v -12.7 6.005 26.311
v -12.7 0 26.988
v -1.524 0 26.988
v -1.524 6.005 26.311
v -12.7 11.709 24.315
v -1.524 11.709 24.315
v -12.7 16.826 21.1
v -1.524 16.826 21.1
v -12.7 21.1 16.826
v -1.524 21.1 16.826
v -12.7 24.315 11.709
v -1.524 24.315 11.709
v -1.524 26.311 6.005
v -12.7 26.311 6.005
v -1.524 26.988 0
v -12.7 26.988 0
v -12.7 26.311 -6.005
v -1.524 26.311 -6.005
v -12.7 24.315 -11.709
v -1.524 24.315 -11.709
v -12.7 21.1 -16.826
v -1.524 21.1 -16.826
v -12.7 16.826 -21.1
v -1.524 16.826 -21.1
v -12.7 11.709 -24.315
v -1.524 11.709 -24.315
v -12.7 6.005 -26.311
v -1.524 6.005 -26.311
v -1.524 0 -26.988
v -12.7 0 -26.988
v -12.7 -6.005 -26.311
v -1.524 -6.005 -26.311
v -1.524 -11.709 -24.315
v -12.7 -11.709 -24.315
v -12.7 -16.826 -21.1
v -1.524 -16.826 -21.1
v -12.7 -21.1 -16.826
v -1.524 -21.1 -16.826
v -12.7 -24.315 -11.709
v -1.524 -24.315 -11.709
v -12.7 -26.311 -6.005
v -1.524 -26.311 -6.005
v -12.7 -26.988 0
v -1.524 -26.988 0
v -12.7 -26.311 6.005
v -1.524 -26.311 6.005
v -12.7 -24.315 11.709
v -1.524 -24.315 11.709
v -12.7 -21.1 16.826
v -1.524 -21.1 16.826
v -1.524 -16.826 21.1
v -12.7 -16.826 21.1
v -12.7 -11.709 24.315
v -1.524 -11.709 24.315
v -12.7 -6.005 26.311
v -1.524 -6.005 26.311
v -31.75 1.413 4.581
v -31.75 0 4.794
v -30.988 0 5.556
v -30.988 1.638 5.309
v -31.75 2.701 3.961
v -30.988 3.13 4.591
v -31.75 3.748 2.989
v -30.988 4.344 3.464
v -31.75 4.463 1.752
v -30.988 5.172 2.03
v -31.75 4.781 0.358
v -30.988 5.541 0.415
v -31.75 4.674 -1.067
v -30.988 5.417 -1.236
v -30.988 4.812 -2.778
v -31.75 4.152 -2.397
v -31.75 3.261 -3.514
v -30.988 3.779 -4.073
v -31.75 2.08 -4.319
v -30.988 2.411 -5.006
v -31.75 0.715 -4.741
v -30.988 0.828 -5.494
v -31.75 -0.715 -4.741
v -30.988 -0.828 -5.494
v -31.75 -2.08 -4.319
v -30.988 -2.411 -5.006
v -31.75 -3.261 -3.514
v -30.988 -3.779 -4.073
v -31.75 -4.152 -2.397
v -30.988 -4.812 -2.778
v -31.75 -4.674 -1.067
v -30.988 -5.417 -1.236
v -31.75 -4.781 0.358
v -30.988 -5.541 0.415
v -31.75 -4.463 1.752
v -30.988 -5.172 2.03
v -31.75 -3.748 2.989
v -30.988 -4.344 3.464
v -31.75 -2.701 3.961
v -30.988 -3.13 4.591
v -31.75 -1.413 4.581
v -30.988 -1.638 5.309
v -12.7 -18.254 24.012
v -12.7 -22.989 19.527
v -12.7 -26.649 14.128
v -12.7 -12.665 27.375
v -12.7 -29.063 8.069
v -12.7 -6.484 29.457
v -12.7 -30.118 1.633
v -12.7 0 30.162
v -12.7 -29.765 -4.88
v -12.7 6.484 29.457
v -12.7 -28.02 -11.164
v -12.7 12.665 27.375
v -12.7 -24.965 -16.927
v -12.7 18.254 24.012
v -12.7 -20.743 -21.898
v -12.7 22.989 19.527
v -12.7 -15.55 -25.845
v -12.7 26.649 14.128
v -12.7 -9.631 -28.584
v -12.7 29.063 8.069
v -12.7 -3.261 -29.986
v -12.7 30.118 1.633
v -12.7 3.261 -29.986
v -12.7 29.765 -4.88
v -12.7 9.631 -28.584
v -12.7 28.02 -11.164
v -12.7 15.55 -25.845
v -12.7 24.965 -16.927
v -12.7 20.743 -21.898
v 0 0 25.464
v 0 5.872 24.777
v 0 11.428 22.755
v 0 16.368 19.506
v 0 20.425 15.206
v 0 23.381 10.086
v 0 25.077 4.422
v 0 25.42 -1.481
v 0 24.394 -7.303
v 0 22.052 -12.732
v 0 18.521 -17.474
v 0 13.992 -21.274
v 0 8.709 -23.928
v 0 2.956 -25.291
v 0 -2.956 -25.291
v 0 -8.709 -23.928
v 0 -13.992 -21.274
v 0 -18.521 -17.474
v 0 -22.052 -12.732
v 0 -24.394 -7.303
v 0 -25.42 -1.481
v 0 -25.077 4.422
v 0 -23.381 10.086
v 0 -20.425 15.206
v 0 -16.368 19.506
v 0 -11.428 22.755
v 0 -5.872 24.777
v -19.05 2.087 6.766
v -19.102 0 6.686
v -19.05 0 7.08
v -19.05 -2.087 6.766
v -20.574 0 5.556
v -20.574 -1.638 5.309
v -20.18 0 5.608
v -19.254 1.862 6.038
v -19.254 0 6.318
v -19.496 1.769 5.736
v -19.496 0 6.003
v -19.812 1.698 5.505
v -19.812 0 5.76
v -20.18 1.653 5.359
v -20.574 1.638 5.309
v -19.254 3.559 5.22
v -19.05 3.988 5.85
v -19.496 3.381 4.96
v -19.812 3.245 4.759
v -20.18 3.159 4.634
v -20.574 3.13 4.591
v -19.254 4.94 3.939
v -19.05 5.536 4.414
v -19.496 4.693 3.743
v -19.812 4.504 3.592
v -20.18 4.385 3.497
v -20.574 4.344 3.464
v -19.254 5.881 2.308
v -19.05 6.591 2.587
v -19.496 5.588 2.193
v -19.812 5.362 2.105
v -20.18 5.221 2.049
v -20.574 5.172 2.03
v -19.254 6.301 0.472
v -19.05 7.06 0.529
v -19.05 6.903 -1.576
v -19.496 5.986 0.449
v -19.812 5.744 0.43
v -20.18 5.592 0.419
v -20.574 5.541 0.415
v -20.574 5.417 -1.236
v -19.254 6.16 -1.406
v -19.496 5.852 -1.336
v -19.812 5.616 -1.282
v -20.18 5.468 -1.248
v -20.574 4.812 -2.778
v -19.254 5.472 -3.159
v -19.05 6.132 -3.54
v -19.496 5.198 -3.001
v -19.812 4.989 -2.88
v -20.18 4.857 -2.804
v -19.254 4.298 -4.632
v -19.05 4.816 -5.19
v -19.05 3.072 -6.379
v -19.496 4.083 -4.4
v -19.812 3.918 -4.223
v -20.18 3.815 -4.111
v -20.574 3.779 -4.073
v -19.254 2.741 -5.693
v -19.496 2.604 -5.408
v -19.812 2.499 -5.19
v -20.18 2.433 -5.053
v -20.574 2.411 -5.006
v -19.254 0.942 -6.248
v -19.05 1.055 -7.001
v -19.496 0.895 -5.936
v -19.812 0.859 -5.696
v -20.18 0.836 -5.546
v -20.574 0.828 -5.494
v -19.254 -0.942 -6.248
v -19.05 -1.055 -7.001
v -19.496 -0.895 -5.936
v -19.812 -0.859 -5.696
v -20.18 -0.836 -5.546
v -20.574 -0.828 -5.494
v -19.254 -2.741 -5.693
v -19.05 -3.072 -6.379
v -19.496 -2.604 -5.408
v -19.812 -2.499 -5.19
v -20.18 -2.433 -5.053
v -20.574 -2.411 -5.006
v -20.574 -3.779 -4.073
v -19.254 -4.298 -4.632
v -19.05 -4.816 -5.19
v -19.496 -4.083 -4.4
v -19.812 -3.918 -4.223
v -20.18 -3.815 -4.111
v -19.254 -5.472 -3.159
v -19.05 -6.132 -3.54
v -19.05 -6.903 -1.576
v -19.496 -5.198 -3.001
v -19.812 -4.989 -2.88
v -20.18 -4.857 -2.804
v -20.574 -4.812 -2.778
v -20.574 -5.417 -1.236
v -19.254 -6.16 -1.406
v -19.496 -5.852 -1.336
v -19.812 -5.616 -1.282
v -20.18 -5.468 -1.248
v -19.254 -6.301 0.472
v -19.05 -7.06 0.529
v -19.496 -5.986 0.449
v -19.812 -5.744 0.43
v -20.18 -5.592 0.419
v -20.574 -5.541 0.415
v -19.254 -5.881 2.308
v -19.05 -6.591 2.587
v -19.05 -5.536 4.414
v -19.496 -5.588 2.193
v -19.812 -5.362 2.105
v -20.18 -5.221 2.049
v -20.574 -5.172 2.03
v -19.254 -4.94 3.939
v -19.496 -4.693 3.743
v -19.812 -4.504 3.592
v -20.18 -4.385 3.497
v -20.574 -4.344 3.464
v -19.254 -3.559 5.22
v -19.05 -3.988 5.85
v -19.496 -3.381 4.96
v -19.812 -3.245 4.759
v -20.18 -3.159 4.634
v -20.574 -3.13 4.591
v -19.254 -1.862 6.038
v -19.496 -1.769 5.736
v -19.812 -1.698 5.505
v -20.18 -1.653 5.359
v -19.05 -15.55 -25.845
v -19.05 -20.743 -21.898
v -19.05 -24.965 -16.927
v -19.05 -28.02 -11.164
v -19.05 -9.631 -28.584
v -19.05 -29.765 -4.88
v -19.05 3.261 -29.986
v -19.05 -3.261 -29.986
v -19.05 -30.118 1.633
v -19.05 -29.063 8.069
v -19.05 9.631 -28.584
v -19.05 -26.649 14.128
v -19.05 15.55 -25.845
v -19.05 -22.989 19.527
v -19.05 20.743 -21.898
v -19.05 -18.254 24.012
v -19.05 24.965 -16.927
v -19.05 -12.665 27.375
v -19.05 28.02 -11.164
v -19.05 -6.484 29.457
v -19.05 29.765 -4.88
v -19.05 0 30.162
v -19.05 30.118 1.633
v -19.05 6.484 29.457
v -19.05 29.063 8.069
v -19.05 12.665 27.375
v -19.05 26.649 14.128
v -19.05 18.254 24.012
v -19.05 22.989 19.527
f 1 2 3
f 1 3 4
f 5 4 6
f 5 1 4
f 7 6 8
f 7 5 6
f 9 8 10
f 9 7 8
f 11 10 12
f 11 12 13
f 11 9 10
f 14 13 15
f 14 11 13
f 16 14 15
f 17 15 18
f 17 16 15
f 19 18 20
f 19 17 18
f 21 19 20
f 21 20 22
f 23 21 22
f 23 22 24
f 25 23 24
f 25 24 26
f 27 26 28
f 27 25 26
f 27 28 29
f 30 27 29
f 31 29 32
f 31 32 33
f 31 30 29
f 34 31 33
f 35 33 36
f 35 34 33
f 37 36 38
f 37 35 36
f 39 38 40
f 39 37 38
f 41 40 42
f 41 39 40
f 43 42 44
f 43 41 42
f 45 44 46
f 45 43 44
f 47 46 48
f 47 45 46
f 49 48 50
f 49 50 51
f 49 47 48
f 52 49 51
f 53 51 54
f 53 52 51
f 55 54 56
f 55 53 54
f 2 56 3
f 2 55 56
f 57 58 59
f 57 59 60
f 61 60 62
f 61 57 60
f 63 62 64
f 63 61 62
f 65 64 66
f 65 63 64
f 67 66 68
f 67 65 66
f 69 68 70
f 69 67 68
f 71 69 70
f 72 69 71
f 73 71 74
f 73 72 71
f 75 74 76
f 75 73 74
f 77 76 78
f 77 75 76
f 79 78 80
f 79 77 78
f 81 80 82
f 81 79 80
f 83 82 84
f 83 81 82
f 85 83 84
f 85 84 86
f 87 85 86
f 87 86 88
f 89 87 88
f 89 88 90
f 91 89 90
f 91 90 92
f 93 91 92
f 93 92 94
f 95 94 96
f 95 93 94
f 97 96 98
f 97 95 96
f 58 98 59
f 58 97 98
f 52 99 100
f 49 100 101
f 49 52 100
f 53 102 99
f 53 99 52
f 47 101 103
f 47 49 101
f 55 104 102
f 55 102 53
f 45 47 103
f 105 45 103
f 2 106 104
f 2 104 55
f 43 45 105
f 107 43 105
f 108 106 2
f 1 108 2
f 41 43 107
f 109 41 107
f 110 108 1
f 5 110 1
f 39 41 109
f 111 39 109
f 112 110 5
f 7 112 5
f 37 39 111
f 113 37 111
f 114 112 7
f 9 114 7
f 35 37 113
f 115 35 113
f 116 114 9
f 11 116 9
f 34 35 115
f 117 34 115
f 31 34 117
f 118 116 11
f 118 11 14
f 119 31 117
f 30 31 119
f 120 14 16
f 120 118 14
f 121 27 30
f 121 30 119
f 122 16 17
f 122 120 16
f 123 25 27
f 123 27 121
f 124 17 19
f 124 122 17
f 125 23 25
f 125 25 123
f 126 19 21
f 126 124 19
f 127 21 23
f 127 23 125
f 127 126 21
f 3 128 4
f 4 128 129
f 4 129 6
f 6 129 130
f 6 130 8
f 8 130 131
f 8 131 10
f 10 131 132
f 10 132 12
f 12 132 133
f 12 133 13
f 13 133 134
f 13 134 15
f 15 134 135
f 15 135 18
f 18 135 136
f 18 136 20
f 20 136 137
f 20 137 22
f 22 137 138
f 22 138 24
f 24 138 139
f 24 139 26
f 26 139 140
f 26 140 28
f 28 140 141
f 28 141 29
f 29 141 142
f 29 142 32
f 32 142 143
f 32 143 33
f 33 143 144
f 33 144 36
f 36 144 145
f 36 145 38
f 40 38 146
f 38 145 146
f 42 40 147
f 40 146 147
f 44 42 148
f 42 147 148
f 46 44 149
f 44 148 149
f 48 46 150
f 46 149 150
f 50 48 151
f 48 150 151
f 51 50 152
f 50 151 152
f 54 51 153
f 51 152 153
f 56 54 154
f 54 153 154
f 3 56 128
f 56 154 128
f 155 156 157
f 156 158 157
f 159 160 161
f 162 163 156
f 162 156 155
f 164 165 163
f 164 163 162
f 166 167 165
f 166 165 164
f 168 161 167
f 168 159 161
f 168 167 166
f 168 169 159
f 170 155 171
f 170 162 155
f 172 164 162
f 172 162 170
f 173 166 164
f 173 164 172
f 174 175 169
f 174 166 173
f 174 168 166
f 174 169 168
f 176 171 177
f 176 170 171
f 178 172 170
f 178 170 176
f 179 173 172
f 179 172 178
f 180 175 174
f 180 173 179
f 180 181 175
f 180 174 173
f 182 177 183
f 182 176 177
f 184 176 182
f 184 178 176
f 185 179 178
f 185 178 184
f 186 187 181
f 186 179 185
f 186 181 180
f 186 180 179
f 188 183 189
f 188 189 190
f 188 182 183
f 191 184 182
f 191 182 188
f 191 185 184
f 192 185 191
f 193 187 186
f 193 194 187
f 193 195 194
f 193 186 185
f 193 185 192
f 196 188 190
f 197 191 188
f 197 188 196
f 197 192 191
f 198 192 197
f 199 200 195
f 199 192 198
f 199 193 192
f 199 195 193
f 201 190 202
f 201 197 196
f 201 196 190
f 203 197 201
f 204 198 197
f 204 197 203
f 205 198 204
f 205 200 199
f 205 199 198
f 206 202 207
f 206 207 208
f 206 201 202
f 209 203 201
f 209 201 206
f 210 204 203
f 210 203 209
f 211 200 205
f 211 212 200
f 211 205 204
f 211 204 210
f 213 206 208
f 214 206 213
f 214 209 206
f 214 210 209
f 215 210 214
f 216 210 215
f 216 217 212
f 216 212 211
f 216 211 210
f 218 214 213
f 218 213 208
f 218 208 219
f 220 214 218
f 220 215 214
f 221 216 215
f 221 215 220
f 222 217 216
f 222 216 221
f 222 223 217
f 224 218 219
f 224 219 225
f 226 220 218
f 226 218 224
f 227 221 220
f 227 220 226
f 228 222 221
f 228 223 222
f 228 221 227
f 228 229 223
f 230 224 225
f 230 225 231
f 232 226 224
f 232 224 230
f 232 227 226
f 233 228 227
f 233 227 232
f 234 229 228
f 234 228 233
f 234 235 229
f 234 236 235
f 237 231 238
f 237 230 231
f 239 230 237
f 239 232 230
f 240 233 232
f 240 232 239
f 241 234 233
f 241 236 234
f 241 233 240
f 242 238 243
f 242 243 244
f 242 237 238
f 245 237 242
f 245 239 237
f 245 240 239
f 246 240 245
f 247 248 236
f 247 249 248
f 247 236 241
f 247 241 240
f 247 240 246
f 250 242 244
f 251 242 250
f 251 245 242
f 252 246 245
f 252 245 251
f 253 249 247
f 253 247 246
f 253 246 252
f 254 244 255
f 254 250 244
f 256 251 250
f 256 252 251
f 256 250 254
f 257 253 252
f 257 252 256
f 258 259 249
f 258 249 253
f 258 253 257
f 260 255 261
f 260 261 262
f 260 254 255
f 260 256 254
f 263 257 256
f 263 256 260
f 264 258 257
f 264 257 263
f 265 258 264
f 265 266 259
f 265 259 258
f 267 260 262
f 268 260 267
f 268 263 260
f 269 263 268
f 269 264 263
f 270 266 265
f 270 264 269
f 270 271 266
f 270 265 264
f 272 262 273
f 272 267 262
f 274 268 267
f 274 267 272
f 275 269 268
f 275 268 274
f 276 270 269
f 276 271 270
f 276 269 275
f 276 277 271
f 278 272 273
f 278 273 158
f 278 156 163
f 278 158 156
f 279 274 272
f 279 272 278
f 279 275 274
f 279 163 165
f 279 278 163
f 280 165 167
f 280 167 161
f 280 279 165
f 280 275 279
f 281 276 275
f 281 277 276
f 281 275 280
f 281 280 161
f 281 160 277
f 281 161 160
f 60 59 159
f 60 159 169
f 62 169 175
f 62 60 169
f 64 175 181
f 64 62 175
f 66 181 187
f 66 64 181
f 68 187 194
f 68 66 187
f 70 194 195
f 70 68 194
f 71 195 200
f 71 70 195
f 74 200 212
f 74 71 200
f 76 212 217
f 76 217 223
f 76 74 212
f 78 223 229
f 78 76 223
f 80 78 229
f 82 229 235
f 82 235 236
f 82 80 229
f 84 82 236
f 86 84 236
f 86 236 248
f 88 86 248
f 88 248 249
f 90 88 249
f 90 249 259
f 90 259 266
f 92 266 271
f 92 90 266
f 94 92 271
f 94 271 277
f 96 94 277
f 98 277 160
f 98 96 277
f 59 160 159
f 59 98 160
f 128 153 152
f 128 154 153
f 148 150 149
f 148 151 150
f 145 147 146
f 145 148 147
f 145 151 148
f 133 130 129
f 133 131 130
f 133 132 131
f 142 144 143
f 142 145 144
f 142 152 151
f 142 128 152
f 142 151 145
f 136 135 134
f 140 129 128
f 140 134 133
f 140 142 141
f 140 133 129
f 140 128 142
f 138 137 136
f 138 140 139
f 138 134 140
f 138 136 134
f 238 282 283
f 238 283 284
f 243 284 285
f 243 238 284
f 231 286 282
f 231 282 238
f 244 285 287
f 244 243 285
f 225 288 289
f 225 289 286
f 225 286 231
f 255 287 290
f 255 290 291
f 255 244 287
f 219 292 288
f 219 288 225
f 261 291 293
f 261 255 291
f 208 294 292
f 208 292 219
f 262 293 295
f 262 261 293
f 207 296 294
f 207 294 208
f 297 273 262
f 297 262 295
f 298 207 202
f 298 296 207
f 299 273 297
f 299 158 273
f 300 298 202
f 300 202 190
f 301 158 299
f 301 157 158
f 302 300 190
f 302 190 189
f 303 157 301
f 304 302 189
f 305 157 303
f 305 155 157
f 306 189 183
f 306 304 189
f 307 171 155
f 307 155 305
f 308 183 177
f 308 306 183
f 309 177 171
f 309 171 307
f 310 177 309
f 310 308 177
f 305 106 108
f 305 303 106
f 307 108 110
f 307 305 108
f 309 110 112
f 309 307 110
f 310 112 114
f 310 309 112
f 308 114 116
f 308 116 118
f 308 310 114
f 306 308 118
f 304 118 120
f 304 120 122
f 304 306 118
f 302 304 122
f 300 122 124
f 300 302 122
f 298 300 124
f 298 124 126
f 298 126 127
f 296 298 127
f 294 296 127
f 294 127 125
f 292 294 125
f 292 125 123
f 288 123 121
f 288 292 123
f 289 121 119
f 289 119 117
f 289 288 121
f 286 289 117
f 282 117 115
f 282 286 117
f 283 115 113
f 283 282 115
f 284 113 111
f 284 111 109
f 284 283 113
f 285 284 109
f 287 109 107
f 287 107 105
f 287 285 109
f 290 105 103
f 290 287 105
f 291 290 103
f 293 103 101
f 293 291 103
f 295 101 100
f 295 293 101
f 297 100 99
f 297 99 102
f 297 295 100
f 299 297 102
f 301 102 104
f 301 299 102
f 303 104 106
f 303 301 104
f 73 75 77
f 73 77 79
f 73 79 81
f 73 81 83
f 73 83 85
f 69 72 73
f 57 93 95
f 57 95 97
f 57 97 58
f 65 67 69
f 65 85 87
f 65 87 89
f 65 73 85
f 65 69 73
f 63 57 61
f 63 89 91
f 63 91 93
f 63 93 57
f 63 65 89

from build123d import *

# Parameters (mm, degrees)
F2_R    = 1.524
F3_SIZE = 0.762
F4_SIZE = 1.524


with BuildPart() as f1:
    # F0 (on Front) → F1 (revolve)
    with BuildSketch(Plane.XZ):
        Polygon((-31.75, 0), (0, 0), (0, 26.9875), (-12.7, 26.9875), (-12.7, 30.1625), (-19.05, 30.1625), (-19.05, 5.55625), (-31.75, 5.55625), align=None)
    revolve(axis=Axis((-15.875, 0, 0), (-1, 0, 0)))

    # F2
    f2_edges = [f1.edges().sort_by_distance(p)[0] for p in [
        (-19.05, 0, -5.55625),
    ]]
    fillet(f2_edges, radius=F2_R)

    # F3
    f3_edges = [f1.edges().sort_by_distance(p)[0] for p in [
        (-31.75, 0, -5.55625),
    ]]
    chamfer(f3_edges, length=F3_SIZE)

    # F4
    f4_edges = [f1.edges().sort_by_distance(p)[0] for p in [
        (0, 0, -26.9875),
    ]]
    chamfer(f4_edges, length=F4_SIZE)


solid = f1.part
